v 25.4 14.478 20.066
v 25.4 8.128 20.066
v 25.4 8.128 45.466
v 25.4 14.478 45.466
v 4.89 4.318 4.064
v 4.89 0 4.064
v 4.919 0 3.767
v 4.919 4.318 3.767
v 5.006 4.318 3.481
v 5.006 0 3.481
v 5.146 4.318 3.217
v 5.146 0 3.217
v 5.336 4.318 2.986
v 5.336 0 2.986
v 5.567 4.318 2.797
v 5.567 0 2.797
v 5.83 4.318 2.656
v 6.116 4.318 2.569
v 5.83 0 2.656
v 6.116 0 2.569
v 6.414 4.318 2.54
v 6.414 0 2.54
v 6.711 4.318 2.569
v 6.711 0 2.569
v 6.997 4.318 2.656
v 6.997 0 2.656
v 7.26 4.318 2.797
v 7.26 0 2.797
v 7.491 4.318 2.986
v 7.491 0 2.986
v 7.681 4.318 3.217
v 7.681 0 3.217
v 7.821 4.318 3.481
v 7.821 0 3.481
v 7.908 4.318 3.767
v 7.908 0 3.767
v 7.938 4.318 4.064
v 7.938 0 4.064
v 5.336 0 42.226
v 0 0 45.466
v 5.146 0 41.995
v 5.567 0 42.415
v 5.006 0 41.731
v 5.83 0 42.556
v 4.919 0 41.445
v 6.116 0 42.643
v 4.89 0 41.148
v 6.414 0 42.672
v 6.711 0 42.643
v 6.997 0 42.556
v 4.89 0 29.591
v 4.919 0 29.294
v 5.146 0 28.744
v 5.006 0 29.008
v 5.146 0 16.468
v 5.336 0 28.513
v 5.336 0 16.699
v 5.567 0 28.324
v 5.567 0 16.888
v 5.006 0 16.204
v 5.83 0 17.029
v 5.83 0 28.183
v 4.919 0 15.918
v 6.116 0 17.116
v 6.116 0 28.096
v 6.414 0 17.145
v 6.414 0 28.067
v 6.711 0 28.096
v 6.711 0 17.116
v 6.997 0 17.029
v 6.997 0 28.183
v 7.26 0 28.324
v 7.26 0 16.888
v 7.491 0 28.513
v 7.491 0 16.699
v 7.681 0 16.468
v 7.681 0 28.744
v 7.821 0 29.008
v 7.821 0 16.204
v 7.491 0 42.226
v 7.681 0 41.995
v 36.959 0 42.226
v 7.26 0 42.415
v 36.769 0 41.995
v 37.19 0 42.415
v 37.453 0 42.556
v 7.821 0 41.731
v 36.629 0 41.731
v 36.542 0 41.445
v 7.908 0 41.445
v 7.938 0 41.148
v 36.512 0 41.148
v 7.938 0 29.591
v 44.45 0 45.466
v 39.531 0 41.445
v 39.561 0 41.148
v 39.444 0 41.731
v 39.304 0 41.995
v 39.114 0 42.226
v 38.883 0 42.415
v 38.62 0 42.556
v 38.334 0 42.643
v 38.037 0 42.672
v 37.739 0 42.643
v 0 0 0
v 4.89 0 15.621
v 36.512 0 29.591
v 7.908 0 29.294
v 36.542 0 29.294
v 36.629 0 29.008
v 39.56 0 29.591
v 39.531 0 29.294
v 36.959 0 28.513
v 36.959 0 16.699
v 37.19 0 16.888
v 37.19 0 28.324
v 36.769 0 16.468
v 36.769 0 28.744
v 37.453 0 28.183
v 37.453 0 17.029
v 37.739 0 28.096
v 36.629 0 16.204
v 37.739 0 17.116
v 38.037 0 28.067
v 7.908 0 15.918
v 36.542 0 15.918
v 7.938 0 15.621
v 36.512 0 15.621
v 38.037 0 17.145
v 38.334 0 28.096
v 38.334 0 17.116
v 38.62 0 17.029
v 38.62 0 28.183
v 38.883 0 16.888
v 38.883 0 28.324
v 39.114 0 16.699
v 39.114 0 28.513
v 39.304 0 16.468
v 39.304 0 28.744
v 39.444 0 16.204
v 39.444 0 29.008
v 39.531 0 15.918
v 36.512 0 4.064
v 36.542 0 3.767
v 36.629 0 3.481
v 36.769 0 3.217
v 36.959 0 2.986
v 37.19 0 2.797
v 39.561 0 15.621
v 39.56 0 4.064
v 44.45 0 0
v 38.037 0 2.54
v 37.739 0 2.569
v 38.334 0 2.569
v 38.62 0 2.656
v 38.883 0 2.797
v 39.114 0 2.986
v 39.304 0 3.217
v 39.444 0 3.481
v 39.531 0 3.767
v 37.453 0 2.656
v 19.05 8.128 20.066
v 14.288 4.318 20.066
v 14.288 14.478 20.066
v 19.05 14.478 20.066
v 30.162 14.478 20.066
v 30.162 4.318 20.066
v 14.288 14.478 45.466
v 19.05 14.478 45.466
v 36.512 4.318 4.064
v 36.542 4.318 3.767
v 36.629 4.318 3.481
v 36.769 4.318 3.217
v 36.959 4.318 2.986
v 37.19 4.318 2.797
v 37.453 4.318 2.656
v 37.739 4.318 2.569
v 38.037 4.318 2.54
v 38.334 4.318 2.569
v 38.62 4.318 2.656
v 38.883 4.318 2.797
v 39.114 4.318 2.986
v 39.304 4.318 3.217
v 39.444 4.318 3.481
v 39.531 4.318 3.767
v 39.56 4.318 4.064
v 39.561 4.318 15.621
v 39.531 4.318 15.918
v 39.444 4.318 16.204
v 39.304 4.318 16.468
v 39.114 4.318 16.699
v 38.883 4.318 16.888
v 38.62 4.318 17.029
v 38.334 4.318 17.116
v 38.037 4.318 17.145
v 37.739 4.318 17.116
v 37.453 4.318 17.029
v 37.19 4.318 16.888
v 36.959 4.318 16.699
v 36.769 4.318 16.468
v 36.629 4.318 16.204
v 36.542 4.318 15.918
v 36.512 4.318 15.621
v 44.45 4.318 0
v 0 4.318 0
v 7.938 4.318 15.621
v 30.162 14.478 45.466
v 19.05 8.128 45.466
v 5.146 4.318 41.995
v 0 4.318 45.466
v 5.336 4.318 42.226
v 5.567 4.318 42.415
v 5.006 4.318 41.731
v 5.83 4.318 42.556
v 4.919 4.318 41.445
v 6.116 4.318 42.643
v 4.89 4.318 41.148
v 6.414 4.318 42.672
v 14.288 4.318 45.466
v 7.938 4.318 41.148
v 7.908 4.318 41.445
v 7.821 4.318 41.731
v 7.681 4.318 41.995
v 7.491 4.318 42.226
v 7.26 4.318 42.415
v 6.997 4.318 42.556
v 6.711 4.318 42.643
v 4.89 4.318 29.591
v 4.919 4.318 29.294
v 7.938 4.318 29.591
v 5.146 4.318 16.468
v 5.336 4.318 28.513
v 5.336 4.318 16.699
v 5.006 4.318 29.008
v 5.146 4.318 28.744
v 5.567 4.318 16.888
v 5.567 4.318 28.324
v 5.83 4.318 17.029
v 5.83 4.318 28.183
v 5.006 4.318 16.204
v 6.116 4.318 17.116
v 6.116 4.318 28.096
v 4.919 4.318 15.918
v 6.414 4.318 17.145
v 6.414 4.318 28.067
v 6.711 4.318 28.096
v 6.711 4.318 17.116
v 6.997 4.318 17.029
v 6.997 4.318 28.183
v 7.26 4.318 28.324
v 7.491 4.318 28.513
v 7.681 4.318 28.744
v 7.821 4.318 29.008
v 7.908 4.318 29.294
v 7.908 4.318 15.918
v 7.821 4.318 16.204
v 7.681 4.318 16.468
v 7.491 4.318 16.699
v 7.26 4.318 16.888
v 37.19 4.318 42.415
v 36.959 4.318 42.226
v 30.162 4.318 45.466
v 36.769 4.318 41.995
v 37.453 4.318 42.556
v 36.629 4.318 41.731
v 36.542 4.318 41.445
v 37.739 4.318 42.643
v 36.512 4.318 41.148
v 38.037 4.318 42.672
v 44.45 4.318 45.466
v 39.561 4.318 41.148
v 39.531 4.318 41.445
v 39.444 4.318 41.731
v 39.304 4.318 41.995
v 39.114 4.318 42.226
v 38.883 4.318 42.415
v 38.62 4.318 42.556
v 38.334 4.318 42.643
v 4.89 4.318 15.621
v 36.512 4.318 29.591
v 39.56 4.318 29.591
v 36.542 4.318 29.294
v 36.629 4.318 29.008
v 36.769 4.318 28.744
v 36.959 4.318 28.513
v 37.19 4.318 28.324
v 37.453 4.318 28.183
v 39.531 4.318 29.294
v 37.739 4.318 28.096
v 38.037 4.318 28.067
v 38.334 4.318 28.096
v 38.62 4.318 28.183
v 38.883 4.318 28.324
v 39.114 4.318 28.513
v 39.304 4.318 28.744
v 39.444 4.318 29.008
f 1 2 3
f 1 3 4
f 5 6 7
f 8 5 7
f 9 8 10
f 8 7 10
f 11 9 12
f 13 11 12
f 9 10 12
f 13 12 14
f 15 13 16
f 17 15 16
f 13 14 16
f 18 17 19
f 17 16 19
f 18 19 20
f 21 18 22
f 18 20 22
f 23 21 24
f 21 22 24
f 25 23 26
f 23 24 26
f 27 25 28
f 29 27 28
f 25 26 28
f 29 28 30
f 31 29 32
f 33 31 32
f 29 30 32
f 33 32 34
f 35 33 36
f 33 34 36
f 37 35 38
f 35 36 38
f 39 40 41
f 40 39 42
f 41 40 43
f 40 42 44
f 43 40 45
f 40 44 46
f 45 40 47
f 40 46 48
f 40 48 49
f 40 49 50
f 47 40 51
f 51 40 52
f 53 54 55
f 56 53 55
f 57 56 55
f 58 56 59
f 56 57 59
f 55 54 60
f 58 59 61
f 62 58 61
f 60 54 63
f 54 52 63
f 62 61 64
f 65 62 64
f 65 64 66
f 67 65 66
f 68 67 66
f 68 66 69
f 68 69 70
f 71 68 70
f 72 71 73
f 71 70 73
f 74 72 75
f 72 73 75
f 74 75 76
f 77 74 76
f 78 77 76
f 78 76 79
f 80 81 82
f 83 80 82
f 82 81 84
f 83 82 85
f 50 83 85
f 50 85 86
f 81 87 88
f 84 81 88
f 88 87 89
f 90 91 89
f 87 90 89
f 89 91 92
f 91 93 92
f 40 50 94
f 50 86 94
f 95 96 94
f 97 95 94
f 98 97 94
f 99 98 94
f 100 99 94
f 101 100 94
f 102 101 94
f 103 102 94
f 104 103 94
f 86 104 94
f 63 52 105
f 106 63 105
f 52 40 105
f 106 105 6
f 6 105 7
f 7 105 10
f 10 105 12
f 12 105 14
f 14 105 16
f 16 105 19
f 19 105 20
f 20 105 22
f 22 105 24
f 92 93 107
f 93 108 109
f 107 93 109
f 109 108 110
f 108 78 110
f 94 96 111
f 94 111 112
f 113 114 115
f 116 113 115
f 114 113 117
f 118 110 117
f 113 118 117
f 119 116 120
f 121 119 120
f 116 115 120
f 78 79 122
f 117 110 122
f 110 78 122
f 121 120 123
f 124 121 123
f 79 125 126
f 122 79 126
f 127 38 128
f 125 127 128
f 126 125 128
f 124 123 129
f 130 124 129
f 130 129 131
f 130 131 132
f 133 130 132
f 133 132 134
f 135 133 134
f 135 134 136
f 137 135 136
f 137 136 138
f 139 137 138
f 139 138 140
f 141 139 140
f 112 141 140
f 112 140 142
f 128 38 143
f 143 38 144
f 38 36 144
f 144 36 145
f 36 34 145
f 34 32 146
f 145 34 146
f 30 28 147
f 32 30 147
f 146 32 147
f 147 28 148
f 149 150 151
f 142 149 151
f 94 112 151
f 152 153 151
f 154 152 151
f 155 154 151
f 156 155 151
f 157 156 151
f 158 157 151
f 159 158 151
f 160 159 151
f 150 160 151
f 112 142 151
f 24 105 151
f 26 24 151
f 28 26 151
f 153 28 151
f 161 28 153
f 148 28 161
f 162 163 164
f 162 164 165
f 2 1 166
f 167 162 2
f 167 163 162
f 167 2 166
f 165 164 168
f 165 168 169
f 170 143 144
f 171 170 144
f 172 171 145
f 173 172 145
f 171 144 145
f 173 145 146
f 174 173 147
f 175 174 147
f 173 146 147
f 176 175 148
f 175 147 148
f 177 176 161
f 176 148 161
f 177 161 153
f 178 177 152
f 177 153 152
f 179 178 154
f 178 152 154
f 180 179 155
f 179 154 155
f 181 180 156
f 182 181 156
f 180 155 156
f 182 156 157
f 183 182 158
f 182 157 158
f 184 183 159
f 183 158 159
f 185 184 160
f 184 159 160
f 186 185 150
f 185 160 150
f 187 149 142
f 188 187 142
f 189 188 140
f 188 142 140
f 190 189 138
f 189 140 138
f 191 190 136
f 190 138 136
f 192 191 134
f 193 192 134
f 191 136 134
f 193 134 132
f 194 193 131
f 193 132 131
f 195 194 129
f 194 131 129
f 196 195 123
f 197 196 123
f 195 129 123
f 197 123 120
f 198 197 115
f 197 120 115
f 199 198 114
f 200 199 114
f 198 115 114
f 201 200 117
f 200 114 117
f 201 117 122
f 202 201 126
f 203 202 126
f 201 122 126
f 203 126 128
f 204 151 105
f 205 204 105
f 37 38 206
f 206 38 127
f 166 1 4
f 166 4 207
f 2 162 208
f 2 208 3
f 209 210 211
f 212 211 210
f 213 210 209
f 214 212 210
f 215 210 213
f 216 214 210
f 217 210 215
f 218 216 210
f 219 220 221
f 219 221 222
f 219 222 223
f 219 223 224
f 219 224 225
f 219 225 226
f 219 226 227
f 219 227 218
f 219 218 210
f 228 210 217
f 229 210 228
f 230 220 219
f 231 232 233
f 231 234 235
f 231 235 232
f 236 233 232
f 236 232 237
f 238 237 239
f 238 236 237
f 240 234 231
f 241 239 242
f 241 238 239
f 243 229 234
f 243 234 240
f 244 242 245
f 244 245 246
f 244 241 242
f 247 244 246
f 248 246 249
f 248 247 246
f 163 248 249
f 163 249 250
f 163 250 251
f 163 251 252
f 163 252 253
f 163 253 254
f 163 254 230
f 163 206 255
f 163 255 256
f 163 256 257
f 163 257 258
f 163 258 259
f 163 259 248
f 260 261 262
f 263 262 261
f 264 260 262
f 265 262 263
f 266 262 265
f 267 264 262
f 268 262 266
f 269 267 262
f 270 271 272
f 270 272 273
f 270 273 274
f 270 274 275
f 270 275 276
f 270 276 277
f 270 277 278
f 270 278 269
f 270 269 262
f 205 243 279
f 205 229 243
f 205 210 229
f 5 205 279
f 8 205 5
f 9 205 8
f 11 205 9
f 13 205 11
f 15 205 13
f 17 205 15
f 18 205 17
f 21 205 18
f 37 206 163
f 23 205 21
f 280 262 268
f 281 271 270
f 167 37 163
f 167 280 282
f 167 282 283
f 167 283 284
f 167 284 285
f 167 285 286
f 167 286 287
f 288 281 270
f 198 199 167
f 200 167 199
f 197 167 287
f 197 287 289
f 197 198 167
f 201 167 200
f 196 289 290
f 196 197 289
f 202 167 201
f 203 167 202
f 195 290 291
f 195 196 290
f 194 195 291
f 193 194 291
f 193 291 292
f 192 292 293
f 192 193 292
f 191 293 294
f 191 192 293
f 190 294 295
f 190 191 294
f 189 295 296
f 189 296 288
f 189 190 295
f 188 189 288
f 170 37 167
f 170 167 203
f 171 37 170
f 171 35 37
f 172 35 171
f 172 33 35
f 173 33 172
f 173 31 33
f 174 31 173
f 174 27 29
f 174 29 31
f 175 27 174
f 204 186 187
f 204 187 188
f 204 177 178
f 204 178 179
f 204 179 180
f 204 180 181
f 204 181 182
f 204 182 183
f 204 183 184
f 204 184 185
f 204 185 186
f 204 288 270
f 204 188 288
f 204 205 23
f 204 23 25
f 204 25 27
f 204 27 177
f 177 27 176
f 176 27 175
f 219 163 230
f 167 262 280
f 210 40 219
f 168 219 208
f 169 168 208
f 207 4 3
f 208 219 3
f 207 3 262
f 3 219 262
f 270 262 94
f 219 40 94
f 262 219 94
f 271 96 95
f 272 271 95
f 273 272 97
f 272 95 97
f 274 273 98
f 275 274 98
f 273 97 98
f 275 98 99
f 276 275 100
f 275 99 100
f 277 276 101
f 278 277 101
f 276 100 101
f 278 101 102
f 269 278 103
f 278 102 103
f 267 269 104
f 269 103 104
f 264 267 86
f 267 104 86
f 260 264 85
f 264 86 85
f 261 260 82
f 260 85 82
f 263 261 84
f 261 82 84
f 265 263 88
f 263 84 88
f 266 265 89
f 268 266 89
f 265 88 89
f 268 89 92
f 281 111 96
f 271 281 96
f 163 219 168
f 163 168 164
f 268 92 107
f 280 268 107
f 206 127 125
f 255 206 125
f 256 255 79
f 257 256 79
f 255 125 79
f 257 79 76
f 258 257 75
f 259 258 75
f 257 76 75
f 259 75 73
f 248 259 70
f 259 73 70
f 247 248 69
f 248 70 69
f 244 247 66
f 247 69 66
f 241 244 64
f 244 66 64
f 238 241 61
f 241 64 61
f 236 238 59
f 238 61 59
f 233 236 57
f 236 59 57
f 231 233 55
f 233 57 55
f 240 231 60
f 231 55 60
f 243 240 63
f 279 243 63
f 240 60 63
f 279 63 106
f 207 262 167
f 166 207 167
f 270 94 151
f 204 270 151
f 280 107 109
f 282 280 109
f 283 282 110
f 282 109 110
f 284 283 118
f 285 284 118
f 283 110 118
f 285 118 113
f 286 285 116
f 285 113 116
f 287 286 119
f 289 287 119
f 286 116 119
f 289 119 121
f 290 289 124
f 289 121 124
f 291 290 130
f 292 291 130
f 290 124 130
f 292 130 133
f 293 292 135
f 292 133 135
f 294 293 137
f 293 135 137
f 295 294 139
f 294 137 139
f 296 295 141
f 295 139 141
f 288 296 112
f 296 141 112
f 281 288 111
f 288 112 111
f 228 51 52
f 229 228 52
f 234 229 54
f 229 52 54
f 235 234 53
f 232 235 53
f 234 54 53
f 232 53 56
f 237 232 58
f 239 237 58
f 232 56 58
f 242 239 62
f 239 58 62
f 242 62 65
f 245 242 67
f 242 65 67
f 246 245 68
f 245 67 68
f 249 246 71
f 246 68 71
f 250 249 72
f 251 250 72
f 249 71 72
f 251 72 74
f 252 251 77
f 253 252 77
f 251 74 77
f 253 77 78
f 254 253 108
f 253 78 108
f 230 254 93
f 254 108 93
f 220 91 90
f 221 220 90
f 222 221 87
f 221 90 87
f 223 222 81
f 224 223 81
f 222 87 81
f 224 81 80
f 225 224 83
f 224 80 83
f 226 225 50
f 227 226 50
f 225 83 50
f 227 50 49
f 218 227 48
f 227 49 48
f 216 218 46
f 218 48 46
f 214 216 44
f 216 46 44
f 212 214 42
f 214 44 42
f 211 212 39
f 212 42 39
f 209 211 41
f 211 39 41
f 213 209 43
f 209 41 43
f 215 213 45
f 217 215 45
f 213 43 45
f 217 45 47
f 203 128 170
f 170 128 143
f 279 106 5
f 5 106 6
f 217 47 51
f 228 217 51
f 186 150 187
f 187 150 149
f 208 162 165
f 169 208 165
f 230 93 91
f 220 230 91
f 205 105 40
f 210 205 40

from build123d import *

# Parameters (mm, degrees)
SKETCH1_W               = 15.875
SKETCH1_H               = 25.4
BOSS_EXTRUDE1_DEPTH     = 4.318
BOSS_EXTRUDE2_START     = 4.318
SKETCH1_3_W             = 15.875
SKETCH1_3_H             = 25.4
BOSS_EXTRUDE2_DEPTH     = 10.16
CUT_EXTRUDE1_DEPTH      = 66.211748481
CUT_EXTRUDE1_DEPTH_BACK = 66.211748481
SKETCH2_W               = 6.35
SKETCH2_H               = 6.35


with BuildPart() as part:
    # Sketch1 → Boss-Extrude1 (new body)
    # profile 1 of 2: a face of its own
    with BuildSketch(Plane(origin=(0, 0, 0), x_dir=(1, 0, 0), z_dir=(0, 1, 0))):
        Polygon((44.45, 0), (0, 0), (0, -45.466), (14.2875, -45.466), (14.2875, -20.066), (30.1625, -20.066), (30.1625, -45.466), (44.45, -45.466), align=None)
        with BuildLine():
            ThreePointArc((4.8895, -29.591), (6.4135, -28.067), (7.9375, -29.591))
            Line((7.9375, -29.591), (7.9375, -41.148))
            ThreePointArc((7.9375, -41.148), (6.4135, -42.672), (4.8895, -41.148))
            Line((4.8895, -41.148), (4.8895, -29.591))
        make_face(mode=Mode.SUBTRACT)
        with BuildLine():
            ThreePointArc((36.5125, -29.591), (38.0365, -28.067), (39.5605, -29.591))
            Line((39.5605, -29.591), (39.5605, -41.148))
            ThreePointArc((39.5605, -41.148), (38.0365, -42.672), (36.5125, -41.148))
            Line((36.5125, -41.148), (36.5125, -29.591))
        make_face(mode=Mode.SUBTRACT)
        with BuildLine():
            ThreePointArc((4.8895, -4.064), (6.4135, -2.54), (7.9375, -4.064))
            Line((7.9375, -4.064), (7.9375, -15.621))
            ThreePointArc((7.9375, -15.621), (6.4135, -17.145), (4.8895, -15.621))
            Line((4.8895, -15.621), (4.8895, -4.064))
        make_face(mode=Mode.SUBTRACT)
        with BuildLine():
            ThreePointArc((36.5125, -4.064), (38.0365, -2.54), (39.5605, -4.064))
            Line((39.5605, -4.064), (39.5605, -15.621))
            ThreePointArc((39.5605, -15.621), (38.0365, -17.145), (36.5125, -15.621))
            Line((36.5125, -15.621), (36.5125, -4.064))
        make_face(mode=Mode.SUBTRACT)
    # profile 2 of 2: a face of its own
    with BuildSketch(Plane(origin=(0, 0, 0), x_dir=(1, 0, 0), z_dir=(0, 1, 0))):
        with Locations((22.225, -32.766)):
            Rectangle(SKETCH1_W, SKETCH1_H)
    extrude(amount=BOSS_EXTRUDE1_DEPTH)

    # Sketch1<3> → Boss-Extrude2 (add)
    with BuildSketch(Plane(origin=(0, 0, 0), x_dir=(1, 0, 0), z_dir=(0, 1, 0)).offset(BOSS_EXTRUDE2_START)):
        with Locations((22.225, -32.766)):
            Rectangle(SKETCH1_3_W, SKETCH1_3_H)
    extrude(amount=BOSS_EXTRUDE2_DEPTH)

    # Sketch2 → Cut-Extrude1 (cut, two sides: drawn at the far end of the back side and taken through both)
    with BuildSketch(Plane.XY.offset(45.466).offset(-CUT_EXTRUDE1_DEPTH_BACK)):
        with Locations((22.225, 11.303)):
            Rectangle(SKETCH2_W, SKETCH2_H)
    extrude(amount=CUT_EXTRUDE1_DEPTH + CUT_EXTRUDE1_DEPTH_BACK, mode=Mode.SUBTRACT)


solid = part.part
